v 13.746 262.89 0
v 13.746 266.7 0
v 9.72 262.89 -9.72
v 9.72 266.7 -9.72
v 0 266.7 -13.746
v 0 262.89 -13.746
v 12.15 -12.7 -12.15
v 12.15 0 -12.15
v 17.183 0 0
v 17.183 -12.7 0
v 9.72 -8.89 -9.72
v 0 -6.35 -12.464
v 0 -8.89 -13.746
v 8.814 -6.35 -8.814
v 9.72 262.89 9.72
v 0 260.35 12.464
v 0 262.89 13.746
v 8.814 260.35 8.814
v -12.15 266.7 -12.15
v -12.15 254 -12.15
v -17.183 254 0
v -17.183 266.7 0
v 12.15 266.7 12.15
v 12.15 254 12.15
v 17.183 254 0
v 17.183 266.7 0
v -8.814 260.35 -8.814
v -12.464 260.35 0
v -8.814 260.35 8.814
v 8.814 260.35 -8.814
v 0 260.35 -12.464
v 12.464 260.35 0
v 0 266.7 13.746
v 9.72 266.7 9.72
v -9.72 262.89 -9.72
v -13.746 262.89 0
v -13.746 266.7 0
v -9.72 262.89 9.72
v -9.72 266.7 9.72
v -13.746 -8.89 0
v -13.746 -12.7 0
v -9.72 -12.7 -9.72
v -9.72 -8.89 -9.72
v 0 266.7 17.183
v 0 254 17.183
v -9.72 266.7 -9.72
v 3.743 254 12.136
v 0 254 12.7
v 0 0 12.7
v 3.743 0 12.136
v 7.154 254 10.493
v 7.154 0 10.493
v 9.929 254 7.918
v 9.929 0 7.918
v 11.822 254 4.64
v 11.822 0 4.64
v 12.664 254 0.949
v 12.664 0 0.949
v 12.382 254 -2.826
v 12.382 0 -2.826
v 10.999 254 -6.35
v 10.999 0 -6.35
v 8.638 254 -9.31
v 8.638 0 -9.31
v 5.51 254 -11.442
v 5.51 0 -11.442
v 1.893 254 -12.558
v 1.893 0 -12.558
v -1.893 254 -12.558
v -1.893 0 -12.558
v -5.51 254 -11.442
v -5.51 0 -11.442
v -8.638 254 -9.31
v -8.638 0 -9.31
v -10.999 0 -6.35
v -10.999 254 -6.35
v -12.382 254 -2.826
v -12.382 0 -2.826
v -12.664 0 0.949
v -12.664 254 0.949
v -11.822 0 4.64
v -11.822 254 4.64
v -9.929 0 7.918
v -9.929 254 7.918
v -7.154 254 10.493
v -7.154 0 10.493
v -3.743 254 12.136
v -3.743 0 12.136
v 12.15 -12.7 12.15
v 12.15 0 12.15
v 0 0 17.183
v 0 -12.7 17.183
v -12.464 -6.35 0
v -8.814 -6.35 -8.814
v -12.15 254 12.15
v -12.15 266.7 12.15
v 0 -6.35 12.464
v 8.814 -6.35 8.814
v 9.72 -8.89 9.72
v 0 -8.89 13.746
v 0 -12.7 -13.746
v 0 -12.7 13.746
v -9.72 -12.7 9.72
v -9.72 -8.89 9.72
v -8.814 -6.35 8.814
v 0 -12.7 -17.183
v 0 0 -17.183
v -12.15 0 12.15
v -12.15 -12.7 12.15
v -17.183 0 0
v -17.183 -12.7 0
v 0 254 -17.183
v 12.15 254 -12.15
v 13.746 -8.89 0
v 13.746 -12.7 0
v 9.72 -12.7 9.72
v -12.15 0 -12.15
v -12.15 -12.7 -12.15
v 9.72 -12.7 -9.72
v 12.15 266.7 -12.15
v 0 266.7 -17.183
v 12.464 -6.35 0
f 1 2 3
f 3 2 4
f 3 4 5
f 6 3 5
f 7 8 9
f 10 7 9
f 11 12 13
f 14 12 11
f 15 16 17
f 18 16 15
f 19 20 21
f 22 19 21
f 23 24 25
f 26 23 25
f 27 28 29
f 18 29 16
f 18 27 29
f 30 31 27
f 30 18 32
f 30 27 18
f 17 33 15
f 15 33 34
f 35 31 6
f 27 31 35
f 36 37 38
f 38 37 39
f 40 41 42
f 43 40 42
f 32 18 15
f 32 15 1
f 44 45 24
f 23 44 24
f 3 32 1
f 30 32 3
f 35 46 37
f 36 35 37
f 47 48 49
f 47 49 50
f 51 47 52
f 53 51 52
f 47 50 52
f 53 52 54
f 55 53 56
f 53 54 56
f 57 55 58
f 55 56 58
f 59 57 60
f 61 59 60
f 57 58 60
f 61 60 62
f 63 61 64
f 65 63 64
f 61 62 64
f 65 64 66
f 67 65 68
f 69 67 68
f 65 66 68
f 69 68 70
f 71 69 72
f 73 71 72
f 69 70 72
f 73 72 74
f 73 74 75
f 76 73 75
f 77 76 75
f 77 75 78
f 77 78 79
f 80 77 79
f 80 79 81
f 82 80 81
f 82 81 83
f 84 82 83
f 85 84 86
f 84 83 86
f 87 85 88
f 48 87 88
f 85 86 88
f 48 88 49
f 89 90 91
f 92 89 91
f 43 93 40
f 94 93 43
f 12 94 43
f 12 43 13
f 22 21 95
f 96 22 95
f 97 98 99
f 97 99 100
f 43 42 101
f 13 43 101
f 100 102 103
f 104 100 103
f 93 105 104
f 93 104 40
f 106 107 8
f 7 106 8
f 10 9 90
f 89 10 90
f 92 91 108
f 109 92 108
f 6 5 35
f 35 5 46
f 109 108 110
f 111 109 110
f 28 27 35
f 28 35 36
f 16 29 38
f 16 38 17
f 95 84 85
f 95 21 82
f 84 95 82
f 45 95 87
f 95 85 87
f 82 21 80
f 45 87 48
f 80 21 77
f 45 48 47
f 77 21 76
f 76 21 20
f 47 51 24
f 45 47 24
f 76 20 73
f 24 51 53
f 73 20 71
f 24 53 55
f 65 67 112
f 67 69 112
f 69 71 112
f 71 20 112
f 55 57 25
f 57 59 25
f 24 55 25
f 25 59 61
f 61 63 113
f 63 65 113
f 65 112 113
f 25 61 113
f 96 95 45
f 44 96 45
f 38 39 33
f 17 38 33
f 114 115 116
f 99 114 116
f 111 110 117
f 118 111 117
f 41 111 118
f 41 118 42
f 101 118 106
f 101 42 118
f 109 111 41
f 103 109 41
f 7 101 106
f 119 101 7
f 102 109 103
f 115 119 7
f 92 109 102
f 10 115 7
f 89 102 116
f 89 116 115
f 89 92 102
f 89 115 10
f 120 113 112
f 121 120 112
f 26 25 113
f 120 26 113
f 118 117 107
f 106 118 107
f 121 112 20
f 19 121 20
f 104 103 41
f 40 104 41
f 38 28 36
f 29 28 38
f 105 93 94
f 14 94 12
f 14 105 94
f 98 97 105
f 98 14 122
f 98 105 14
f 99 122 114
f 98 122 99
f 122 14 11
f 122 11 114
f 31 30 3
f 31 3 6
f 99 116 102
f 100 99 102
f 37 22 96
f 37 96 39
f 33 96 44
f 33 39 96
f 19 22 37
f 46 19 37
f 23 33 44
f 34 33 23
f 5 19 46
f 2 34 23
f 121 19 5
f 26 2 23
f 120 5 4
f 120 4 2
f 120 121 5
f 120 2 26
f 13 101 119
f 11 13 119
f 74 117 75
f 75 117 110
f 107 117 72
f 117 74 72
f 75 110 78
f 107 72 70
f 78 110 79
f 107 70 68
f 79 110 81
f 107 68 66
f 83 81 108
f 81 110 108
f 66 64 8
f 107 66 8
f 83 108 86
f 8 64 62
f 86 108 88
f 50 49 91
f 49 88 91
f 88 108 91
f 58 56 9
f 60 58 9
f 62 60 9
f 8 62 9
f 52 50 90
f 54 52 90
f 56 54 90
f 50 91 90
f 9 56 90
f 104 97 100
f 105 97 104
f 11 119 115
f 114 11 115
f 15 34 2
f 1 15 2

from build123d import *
from OCP.BRepFilletAPI import BRepFilletAPI_MakeChamfer

# Parameters (mm, degrees)
SKETCH1_R           = 12.7
BOSS_EXTRUDE1_DEPTH = 254
BOSS_EXTRUDE2_DEPTH = 12.7
BOSS_EXTRUDE3_DEPTH = 12.7
CUT_EXTRUDE1_DEPTH  = 6.35
CUT_EXTRUDE2_DEPTH  = 6.35
CHAMFER1_SIZE       = 2.54
CHAMFER1_SIZE2      = 1.184421452
CHAMFER2_SIZE       = 2.54
CHAMFER2_SIZE2      = 1.184421452


with BuildPart() as part:
    # Sketch1 → Boss-Extrude1 (new body)
    with BuildSketch(Plane(origin=(0, 0, 0), x_dir=(1, 0, 0), z_dir=(0, 1, 0))):
        with Locations(Location((0, 0, 0), (0, 0, 270))):
            Circle(SKETCH1_R)
    extrude(amount=BOSS_EXTRUDE1_DEPTH)

    # Sketch2 → Boss-Extrude2 (add)
    with BuildSketch(Plane(origin=(0, 254, 0), x_dir=(1, 0, 0), z_dir=(0, 1, 0))):
        Polygon((0, 17.18297618), (-12.150198978, 12.150198978), (-17.18297618, 0), (-12.150198978, -12.150198978), (0, -17.18297618), (12.150198978, -12.150198978), (17.18297618, 0), (12.150198978, 12.150198978), align=None)
    extrude(amount=BOSS_EXTRUDE2_DEPTH)

    # Sketch3 → Boss-Extrude3 (add)
    with BuildSketch(Plane.XZ):
        Polygon((0, 17.18297618), (-12.150198978, 12.150198978), (-17.18297618, 0), (-12.150198978, -12.150198978), (0, -17.18297618), (12.150198978, -12.150198978), (17.18297618, 0), (12.150198978, 12.150198978), align=None)
    extrude(amount=BOSS_EXTRUDE3_DEPTH)

    # Sketch4 → Cut-Extrude1 (cut)
    with BuildSketch(Plane(origin=(0, 266.7, 0), x_dir=(1, 0, 0), z_dir=(0, 1, 0))):
        Polygon((0, 13.746380944), (-9.720159182, 9.720159182), (-13.746380944, 0), (-9.720159182, -9.720159182), (0, -13.746380944), (9.720159182, -9.720159182), (13.746380944, 0), (9.720159182, 9.720159182), align=None)
    extrude(amount=-CUT_EXTRUDE1_DEPTH, mode=Mode.SUBTRACT)

    # Sketch5 → Cut-Extrude2 (cut)
    with BuildSketch(Plane.XZ.offset(12.7)):
        Polygon((0, 13.746380944), (-9.720159182, 9.720159182), (-13.746380944, 0), (-9.720159182, -9.720159182), (0, -13.746380944), (9.720159182, -9.720159182), (13.746380944, 0), (9.720159182, 9.720159182), align=None)
    extrude(amount=-CUT_EXTRUDE2_DEPTH, mode=Mode.SUBTRACT)

    # Chamfer1: one chamfer whose edges measure the first distance from different faces: ONE call of the kernel's chamfer builder (chamfer() names one face for all edges)
    chamfer1_edges_1 = [part.edges().sort_by_distance(p)[0] for p in [
        (4.860079591, -6.35, 11.733270063),
    ]]
    chamfer1_side_1 = [part.faces().sort_by_distance(p)[0] for p in [
        (4.860079591, -9.525, 11.733270063),
    ]]
    chamfer1_edges_2 = [part.edges().sort_by_distance(p)[0] for p in [
        (11.733270063, -6.35, 4.860079591),
    ]]
    chamfer1_side_2 = [part.faces().sort_by_distance(p)[0] for p in [
        (11.733270063, -9.525, 4.860079591),
    ]]
    chamfer1_edges_3 = [part.edges().sort_by_distance(p)[0] for p in [
        (11.733270063, -6.35, -4.860079591),
    ]]
    chamfer1_side_3 = [part.faces().sort_by_distance(p)[0] for p in [
        (11.733270063, -9.525, -4.860079591),
    ]]
    chamfer1_edges_4 = [part.edges().sort_by_distance(p)[0] for p in [
        (4.860079591, -6.35, -11.733270063),
    ]]
    chamfer1_side_4 = [part.faces().sort_by_distance(p)[0] for p in [
        (4.860079591, -9.525, -11.733270063),
    ]]
    chamfer1_edges_5 = [part.edges().sort_by_distance(p)[0] for p in [
        (-4.860079591, -6.35, -11.733270063),
    ]]
    chamfer1_side_5 = [part.faces().sort_by_distance(p)[0] for p in [
        (-4.860079591, -9.525, -11.733270063),
    ]]
    chamfer1_edges_6 = [part.edges().sort_by_distance(p)[0] for p in [
        (-11.733270063, -6.35, -4.860079591),
    ]]
    chamfer1_side_6 = [part.faces().sort_by_distance(p)[0] for p in [
        (-11.733270063, -9.525, -4.860079591),
    ]]
    chamfer1_edges_7 = [part.edges().sort_by_distance(p)[0] for p in [
        (-11.733270063, -6.35, 4.860079591),
    ]]
    chamfer1_side_7 = [part.faces().sort_by_distance(p)[0] for p in [
        (-11.733270063, -9.525, 4.860079591),
    ]]
    chamfer1_edges_8 = [part.edges().sort_by_distance(p)[0] for p in [
        (-4.860079591, -6.35, 11.733270063),
    ]]
    chamfer1_side_8 = [part.faces().sort_by_distance(p)[0] for p in [
        (-4.860079591, -9.525, 11.733270063),
    ]]
    chamfer1 = BRepFilletAPI_MakeChamfer(part.part.solid().wrapped)
    for e in chamfer1_edges_1:
        chamfer1.Add(CHAMFER1_SIZE, CHAMFER1_SIZE2, e.wrapped, chamfer1_side_1[0].wrapped)  # the first distance lies on this face
    for e in chamfer1_edges_2:
        chamfer1.Add(CHAMFER1_SIZE, CHAMFER1_SIZE2, e.wrapped, chamfer1_side_2[0].wrapped)  # the first distance lies on this face
    for e in chamfer1_edges_3:
        chamfer1.Add(CHAMFER1_SIZE, CHAMFER1_SIZE2, e.wrapped, chamfer1_side_3[0].wrapped)  # the first distance lies on this face
    for e in chamfer1_edges_4:
        chamfer1.Add(CHAMFER1_SIZE, CHAMFER1_SIZE2, e.wrapped, chamfer1_side_4[0].wrapped)  # the first distance lies on this face
    for e in chamfer1_edges_5:
        chamfer1.Add(CHAMFER1_SIZE, CHAMFER1_SIZE2, e.wrapped, chamfer1_side_5[0].wrapped)  # the first distance lies on this face
    for e in chamfer1_edges_6:
        chamfer1.Add(CHAMFER1_SIZE, CHAMFER1_SIZE2, e.wrapped, chamfer1_side_6[0].wrapped)  # the first distance lies on this face
    for e in chamfer1_edges_7:
        chamfer1.Add(CHAMFER1_SIZE, CHAMFER1_SIZE2, e.wrapped, chamfer1_side_7[0].wrapped)  # the first distance lies on this face
    for e in chamfer1_edges_8:
        chamfer1.Add(CHAMFER1_SIZE, CHAMFER1_SIZE2, e.wrapped, chamfer1_side_8[0].wrapped)  # the first distance lies on this face
    add(Compound.cast(chamfer1.Shape()), mode=Mode.REPLACE)

    # Chamfer2: one chamfer whose edges measure the first distance from different faces: ONE call of the kernel's chamfer builder (chamfer() names one face for all edges)
    chamfer2_edges_1 = [part.edges().sort_by_distance(p)[0] for p in [
        (4.860079591, 260.35, -11.733270063),
    ]]
    chamfer2_side_1 = [part.faces().sort_by_distance(p)[0] for p in [
        (4.860079591, 263.525, -11.733270063),
    ]]
    chamfer2_edges_2 = [part.edges().sort_by_distance(p)[0] for p in [
        (11.733270063, 260.35, -4.860079591),
    ]]
    chamfer2_side_2 = [part.faces().sort_by_distance(p)[0] for p in [
        (11.733270063, 263.525, -4.860079591),
    ]]
    chamfer2_edges_3 = [part.edges().sort_by_distance(p)[0] for p in [
        (11.733270063, 260.35, 4.860079591),
    ]]
    chamfer2_side_3 = [part.faces().sort_by_distance(p)[0] for p in [
        (11.733270063, 263.525, 4.860079591),
    ]]
    chamfer2_edges_4 = [part.edges().sort_by_distance(p)[0] for p in [
        (4.860079591, 260.35, 11.733270063),
    ]]
    chamfer2_side_4 = [part.faces().sort_by_distance(p)[0] for p in [
        (4.860079591, 263.525, 11.733270063),
    ]]
    chamfer2_edges_5 = [part.edges().sort_by_distance(p)[0] for p in [
        (-4.860079591, 260.35, 11.733270063),
    ]]
    chamfer2_side_5 = [part.faces().sort_by_distance(p)[0] for p in [
        (-4.860079591, 263.525, 11.733270063),
    ]]
    chamfer2_edges_6 = [part.edges().sort_by_distance(p)[0] for p in [
        (-11.733270063, 260.35, 4.860079591),
    ]]
    chamfer2_side_6 = [part.faces().sort_by_distance(p)[0] for p in [
        (-11.733270063, 263.525, 4.860079591),
    ]]
    chamfer2_edges_7 = [part.edges().sort_by_distance(p)[0] for p in [
        (-11.733270063, 260.35, -4.860079591),
    ]]
    chamfer2_side_7 = [part.faces().sort_by_distance(p)[0] for p in [
        (-11.733270063, 263.525, -4.860079591),
    ]]
    chamfer2_edges_8 = [part.edges().sort_by_distance(p)[0] for p in [
        (-4.860079591, 260.35, -11.733270063),
    ]]
    chamfer2_side_8 = [part.faces().sort_by_distance(p)[0] for p in [
        (-4.860079591, 263.525, -11.733270063),
    ]]
    chamfer2 = BRepFilletAPI_MakeChamfer(part.part.solid().wrapped)
    for e in chamfer2_edges_1:
        chamfer2.Add(CHAMFER2_SIZE, CHAMFER2_SIZE2, e.wrapped, chamfer2_side_1[0].wrapped)  # the first distance lies on this face
    for e in chamfer2_edges_2:
        chamfer2.Add(CHAMFER2_SIZE, CHAMFER2_SIZE2, e.wrapped, chamfer2_side_2[0].wrapped)  # the first distance lies on this face
    for e in chamfer2_edges_3:
        chamfer2.Add(CHAMFER2_SIZE, CHAMFER2_SIZE2, e.wrapped, chamfer2_side_3[0].wrapped)  # the first distance lies on this face
    for e in chamfer2_edges_4:
        chamfer2.Add(CHAMFER2_SIZE, CHAMFER2_SIZE2, e.wrapped, chamfer2_side_4[0].wrapped)  # the first distance lies on this face
    for e in chamfer2_edges_5:
        chamfer2.Add(CHAMFER2_SIZE, CHAMFER2_SIZE2, e.wrapped, chamfer2_side_5[0].wrapped)  # the first distance lies on this face
    for e in chamfer2_edges_6:
        chamfer2.Add(CHAMFER2_SIZE, CHAMFER2_SIZE2, e.wrapped, chamfer2_side_6[0].wrapped)  # the first distance lies on this face
    for e in chamfer2_edges_7:
        chamfer2.Add(CHAMFER2_SIZE, CHAMFER2_SIZE2, e.wrapped, chamfer2_side_7[0].wrapped)  # the first distance lies on this face
    for e in chamfer2_edges_8:
        chamfer2.Add(CHAMFER2_SIZE, CHAMFER2_SIZE2, e.wrapped, chamfer2_side_8[0].wrapped)  # the first distance lies on this face
    add(Compound.cast(chamfer2.Shape()), mode=Mode.REPLACE)


solid = part.part
